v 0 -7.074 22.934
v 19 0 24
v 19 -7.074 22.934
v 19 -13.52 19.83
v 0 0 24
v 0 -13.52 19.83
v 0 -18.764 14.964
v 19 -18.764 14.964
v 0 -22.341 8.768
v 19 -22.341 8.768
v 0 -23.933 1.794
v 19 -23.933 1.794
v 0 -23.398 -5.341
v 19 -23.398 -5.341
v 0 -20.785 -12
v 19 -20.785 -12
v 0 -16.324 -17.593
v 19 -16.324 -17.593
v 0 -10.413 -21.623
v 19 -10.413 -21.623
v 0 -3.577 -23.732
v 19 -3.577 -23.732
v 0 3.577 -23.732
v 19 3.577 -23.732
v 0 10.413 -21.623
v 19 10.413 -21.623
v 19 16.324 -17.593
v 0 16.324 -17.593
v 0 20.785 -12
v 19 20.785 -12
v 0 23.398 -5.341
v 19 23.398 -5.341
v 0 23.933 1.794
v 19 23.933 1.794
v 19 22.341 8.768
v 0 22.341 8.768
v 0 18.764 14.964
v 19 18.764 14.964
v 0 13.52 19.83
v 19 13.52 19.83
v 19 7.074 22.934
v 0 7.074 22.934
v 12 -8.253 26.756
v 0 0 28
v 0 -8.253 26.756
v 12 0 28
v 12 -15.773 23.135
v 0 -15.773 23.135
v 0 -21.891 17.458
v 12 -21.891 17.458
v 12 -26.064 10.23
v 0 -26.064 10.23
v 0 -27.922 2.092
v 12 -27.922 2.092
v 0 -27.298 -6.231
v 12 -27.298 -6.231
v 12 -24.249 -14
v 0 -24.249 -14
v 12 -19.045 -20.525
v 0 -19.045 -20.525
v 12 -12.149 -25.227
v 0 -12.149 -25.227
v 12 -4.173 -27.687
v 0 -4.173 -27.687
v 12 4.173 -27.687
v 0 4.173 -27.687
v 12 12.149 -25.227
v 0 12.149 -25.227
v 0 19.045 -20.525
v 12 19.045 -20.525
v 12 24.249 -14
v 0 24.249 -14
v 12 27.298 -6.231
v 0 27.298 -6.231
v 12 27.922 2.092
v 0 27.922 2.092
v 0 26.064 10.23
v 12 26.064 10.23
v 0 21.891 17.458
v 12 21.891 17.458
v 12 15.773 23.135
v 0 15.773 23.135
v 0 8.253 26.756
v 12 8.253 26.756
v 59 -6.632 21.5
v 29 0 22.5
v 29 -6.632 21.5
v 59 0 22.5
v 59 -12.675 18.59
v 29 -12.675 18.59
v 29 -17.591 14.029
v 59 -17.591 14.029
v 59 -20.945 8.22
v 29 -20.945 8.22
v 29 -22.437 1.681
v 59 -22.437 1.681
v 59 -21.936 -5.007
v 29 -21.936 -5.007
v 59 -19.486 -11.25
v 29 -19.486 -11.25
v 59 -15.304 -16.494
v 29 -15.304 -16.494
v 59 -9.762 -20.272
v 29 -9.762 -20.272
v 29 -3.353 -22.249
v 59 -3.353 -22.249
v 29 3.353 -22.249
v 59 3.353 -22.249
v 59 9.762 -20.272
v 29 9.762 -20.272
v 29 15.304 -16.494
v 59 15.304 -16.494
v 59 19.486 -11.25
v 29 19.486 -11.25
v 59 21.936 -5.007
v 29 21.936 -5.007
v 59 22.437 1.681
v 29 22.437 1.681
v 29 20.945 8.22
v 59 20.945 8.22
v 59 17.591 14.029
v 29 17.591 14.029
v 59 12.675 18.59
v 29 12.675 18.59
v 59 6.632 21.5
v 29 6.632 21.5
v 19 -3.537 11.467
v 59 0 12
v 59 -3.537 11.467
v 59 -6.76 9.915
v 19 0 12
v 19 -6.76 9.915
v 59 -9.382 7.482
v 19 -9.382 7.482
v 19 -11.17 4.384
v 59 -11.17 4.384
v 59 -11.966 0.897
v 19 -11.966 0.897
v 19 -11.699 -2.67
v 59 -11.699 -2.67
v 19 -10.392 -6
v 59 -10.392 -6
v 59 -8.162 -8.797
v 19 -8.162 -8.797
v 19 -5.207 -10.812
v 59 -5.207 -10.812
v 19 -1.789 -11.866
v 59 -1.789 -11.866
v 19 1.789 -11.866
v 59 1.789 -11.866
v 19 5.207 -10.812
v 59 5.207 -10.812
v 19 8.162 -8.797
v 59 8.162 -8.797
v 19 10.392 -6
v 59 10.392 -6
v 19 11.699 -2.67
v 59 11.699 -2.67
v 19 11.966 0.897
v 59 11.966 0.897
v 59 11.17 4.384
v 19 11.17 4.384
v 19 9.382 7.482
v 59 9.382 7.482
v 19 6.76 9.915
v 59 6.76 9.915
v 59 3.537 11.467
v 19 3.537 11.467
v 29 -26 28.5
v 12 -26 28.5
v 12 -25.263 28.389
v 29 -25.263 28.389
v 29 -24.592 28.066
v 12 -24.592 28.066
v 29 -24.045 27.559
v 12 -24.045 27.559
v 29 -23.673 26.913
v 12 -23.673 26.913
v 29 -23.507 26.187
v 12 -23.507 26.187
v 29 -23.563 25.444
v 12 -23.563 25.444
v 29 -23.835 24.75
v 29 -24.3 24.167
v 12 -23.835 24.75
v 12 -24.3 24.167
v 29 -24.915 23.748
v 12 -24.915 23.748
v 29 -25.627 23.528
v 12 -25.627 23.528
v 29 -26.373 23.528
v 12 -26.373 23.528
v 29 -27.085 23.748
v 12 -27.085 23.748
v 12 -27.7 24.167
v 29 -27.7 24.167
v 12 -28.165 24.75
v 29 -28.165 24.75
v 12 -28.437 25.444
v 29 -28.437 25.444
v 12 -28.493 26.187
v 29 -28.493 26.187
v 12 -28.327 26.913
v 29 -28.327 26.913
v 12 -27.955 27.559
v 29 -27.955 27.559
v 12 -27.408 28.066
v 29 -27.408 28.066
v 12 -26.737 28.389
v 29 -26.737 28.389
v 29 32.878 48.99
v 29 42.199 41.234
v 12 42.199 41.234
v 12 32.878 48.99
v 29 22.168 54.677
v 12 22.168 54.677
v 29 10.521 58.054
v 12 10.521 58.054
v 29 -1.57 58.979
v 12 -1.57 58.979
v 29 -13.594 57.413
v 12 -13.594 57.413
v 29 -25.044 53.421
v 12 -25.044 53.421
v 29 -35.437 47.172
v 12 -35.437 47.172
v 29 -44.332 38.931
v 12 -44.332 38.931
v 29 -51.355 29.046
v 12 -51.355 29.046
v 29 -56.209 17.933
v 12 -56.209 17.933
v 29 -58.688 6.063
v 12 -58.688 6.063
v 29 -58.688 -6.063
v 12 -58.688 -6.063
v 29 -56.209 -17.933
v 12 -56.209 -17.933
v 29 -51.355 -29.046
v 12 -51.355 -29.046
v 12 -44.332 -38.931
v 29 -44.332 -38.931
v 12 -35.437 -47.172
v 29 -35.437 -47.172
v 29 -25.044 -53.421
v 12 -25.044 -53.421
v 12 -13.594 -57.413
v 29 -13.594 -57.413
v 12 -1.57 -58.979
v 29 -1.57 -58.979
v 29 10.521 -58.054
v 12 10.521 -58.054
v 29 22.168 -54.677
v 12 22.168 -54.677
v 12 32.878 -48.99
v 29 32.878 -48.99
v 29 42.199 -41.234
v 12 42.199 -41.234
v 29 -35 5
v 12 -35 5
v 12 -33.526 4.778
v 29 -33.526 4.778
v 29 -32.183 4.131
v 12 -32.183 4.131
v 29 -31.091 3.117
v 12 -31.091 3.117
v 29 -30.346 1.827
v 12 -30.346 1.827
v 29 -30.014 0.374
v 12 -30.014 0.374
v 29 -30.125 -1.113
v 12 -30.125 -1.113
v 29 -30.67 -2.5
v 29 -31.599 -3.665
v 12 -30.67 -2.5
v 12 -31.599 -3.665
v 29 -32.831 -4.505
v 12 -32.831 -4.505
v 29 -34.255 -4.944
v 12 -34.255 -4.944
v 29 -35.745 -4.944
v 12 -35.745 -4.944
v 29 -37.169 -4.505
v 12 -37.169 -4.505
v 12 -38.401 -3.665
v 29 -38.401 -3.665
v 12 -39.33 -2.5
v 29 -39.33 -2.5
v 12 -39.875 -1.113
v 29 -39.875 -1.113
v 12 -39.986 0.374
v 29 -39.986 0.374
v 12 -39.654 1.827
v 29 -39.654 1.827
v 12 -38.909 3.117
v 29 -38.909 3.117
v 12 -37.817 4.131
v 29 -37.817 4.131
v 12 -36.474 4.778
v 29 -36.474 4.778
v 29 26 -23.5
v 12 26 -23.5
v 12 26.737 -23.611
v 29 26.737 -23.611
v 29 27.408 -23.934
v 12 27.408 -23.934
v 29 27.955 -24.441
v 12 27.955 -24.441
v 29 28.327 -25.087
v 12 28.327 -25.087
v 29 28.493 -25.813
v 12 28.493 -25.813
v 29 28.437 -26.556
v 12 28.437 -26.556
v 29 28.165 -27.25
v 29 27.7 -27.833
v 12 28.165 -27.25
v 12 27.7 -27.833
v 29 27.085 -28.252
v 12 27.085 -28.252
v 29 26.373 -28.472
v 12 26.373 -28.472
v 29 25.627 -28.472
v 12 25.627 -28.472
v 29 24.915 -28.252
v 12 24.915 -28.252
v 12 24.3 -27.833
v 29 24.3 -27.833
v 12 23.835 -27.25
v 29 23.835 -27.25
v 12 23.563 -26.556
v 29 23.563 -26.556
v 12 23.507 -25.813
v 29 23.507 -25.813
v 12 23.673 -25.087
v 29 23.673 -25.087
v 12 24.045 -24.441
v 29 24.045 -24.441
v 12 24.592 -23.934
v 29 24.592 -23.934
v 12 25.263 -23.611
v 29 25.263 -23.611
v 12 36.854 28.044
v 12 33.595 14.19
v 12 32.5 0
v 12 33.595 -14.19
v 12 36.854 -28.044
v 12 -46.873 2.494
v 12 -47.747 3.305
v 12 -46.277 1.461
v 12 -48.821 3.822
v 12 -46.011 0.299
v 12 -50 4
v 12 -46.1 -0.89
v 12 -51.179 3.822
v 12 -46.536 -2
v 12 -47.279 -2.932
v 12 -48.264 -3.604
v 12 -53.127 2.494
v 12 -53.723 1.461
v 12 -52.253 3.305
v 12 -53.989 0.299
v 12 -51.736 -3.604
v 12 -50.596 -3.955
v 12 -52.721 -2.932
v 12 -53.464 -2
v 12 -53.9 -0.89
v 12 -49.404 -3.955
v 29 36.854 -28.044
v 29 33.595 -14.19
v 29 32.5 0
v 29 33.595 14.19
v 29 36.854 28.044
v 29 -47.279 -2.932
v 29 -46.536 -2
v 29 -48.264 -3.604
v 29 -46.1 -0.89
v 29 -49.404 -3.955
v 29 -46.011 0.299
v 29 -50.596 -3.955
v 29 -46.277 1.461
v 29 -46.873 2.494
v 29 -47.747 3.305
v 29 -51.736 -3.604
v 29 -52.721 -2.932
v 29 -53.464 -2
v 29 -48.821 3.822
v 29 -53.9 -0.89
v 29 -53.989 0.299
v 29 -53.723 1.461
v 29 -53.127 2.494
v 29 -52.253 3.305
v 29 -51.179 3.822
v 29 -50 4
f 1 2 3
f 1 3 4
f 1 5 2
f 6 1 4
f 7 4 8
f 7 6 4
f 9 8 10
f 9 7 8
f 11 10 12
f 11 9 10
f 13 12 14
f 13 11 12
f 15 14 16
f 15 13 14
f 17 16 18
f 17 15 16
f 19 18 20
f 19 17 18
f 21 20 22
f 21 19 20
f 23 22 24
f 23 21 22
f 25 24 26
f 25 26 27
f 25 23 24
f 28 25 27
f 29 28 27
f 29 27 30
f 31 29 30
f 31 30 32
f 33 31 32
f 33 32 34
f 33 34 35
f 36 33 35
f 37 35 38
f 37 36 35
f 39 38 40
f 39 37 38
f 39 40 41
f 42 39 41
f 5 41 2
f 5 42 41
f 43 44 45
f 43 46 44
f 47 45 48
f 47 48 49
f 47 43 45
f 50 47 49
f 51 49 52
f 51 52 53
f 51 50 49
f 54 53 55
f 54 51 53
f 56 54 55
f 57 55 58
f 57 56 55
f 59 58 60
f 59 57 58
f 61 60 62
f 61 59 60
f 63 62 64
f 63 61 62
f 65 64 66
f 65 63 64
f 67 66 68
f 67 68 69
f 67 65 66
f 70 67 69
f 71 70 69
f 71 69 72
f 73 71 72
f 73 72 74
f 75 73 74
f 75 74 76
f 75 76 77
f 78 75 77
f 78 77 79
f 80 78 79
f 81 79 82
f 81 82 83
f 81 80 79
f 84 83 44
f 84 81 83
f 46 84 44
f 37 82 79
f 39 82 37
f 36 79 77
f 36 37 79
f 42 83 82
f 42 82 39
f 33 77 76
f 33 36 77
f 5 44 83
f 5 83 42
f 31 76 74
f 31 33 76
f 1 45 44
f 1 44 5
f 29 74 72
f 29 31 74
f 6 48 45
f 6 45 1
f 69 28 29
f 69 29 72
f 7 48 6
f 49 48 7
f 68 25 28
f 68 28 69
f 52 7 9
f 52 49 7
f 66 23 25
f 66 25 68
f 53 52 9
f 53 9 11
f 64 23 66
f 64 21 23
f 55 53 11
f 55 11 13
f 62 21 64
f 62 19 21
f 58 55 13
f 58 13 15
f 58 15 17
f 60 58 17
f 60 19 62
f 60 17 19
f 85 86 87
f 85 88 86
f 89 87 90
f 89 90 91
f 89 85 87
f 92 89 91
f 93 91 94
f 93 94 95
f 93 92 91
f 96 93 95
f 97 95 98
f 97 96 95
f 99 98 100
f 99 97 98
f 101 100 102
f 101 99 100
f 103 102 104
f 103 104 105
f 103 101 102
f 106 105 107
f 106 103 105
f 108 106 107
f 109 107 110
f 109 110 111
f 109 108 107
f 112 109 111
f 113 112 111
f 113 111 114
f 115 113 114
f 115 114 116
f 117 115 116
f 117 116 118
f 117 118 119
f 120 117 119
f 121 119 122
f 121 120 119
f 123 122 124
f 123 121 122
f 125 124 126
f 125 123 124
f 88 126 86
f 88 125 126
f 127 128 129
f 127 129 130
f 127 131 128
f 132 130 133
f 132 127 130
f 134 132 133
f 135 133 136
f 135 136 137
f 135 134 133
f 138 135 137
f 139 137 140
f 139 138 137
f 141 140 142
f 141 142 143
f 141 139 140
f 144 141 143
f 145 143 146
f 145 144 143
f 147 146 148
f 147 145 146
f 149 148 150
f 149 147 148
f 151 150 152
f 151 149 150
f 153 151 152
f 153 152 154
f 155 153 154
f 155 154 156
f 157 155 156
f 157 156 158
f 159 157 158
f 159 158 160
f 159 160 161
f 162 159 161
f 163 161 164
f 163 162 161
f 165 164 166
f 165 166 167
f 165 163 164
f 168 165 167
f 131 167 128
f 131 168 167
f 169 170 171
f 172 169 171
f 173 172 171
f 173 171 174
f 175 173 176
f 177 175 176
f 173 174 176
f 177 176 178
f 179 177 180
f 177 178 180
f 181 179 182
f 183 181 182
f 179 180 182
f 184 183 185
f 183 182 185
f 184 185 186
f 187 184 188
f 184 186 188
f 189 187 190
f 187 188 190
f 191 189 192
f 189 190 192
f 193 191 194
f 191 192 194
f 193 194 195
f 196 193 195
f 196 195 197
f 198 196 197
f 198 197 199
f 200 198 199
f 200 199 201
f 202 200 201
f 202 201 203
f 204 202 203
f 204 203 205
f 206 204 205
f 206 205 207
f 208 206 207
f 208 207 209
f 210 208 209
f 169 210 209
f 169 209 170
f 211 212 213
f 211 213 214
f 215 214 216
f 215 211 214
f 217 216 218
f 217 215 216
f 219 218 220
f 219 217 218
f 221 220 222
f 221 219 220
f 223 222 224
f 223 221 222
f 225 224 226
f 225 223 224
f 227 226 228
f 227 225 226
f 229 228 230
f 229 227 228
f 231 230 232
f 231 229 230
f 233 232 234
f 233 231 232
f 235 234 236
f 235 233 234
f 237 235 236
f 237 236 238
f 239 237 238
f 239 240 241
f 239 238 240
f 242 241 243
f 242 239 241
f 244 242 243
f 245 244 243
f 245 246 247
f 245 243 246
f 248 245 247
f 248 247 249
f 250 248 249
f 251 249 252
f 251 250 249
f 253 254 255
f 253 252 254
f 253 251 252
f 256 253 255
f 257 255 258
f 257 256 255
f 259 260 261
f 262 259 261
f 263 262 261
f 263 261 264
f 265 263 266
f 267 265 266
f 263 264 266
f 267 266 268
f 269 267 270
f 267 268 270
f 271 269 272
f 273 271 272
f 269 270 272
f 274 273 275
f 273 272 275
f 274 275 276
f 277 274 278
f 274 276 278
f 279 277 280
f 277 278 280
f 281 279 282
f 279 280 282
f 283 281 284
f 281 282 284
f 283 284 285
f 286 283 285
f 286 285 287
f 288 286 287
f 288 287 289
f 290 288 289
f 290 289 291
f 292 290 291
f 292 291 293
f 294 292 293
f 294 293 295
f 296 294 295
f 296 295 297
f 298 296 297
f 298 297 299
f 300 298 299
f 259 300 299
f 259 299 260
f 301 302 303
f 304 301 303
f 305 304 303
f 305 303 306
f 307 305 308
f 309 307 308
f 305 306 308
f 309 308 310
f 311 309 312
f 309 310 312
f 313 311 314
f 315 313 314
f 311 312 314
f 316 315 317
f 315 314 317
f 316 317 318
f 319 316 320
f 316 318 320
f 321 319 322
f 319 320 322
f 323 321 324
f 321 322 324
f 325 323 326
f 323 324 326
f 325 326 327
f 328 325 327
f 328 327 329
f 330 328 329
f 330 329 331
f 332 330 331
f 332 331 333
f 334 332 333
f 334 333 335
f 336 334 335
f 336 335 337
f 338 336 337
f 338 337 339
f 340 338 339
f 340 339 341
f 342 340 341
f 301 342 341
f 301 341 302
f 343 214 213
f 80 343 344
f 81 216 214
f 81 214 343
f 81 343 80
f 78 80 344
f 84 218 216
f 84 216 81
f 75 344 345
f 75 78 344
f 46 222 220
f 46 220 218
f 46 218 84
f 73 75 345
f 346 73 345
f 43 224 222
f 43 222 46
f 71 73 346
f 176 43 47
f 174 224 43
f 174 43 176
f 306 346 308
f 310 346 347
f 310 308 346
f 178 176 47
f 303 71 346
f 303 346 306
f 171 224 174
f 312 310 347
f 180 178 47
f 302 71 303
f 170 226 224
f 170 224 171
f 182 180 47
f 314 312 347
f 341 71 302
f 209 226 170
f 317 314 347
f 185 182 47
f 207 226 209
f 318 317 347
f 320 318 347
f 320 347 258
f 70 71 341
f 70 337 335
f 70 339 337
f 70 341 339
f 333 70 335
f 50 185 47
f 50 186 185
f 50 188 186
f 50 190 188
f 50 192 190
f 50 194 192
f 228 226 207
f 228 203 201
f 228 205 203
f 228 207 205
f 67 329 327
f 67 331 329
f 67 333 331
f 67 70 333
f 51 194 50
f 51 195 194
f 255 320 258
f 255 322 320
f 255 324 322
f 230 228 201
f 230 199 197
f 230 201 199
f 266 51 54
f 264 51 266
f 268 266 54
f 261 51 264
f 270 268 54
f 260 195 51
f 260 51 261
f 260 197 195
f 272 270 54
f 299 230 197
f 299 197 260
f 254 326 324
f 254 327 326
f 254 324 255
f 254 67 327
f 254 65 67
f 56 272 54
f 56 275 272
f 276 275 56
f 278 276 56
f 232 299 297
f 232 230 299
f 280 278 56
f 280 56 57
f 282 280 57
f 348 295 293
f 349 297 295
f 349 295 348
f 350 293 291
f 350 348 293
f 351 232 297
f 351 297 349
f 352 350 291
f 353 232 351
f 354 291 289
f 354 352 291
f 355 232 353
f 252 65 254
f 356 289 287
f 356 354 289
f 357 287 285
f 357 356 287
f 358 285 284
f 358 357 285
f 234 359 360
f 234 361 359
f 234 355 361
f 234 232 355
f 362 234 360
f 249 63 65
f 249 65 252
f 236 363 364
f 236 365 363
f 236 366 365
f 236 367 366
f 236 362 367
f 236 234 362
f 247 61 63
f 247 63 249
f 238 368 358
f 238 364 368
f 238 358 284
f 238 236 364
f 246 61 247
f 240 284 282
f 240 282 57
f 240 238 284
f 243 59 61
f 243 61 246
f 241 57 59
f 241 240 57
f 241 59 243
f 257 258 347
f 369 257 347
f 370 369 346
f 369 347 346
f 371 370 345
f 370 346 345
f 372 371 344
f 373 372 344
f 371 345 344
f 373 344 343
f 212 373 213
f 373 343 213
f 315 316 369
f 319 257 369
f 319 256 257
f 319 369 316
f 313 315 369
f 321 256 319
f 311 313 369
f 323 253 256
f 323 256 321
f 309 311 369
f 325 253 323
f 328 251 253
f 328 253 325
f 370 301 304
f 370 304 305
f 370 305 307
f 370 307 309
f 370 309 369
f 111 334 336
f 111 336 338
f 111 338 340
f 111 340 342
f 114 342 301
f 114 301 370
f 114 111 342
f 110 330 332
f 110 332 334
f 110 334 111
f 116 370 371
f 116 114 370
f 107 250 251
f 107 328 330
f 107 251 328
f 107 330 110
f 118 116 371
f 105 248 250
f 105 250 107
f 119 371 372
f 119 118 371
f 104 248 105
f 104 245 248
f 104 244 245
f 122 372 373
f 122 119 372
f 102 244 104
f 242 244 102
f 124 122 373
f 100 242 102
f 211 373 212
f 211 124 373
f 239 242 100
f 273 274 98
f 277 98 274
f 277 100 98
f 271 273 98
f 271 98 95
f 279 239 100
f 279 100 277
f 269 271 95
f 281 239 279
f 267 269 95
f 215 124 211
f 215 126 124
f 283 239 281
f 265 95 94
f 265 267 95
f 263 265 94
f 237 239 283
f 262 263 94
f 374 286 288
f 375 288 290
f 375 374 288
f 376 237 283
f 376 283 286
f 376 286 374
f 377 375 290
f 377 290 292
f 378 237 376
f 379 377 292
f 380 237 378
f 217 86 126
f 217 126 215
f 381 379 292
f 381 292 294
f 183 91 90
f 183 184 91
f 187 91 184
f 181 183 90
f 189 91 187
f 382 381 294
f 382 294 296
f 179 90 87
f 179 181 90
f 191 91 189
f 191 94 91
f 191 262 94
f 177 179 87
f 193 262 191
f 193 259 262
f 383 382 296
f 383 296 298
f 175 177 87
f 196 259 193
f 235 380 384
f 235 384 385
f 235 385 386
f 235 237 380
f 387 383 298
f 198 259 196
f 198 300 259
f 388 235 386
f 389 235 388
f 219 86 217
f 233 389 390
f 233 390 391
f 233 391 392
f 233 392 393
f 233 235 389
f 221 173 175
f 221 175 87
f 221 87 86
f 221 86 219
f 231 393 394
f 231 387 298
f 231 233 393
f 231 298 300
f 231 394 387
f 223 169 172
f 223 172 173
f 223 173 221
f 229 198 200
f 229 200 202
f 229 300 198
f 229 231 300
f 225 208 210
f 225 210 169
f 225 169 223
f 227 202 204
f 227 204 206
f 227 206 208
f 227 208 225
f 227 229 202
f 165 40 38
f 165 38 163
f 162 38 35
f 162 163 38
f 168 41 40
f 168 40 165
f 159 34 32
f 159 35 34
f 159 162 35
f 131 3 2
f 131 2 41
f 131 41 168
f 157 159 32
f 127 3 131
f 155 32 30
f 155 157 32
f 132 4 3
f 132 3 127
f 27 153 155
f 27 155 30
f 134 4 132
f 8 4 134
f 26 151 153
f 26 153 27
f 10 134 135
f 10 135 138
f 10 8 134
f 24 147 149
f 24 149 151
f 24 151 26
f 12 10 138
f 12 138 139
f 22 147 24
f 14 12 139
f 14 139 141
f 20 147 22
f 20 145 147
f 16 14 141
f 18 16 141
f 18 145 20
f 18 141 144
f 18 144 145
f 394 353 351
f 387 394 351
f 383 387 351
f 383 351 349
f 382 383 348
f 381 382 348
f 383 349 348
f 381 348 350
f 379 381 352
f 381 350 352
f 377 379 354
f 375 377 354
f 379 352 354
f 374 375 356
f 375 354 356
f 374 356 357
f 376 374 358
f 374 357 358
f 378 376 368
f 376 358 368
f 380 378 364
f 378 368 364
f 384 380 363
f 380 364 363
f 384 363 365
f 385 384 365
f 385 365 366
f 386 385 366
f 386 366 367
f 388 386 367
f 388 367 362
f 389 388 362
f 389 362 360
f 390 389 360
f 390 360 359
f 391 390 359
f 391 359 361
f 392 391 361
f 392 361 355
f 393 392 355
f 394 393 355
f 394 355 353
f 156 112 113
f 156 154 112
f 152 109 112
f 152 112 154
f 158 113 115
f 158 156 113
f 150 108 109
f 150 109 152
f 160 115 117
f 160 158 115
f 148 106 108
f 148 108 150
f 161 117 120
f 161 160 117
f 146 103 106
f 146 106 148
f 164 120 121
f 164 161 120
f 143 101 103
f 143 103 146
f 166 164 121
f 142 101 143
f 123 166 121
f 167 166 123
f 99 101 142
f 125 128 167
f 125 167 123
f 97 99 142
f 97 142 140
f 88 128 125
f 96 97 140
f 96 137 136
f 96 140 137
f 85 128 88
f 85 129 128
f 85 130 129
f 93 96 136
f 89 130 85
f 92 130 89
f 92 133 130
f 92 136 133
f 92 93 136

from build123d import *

# Parameters (mm, degrees)
ESQUISSE2_R             = 92.5
ENL_V_MAT_EXTRU_1_DEPTH = 96.765338197
ESQUISSE6_R             = 5
ESQUISSE6_R_2           = 4
ENL_V_MAT_EXTRU_2_DEPTH = 96.765338197
ESQUISSE7_R             = 2.5
ENL_V_MAT_EXTRU_3_DEPTH = 96.765338197


with BuildPart() as part:
    # Esquisse1 → Base-Révolution (revolve)
    with BuildSketch(Plane.XY, mode=Mode.PRIVATE) as base_r_volution_sk:
        Polygon((0, 24), (0, 28), (12, 28), (12, 59), (29, 59), (29, 22.5), (59, 22.5), (59, 12), (19, 12), (19, 24), align=None)
    revolve(base_r_volution_sk.sketch.rotate(Axis((-50, 0, 0), (1, 0, 0)), 90), axis=Axis((-50, 0, 0), (1, 0, 0)))

    # Esquisse2 → Enlèv. mat.-Extru.1 (cut, through all)
    with BuildSketch(Plane.ZY.offset(-12)):
        with Locations((0, 125)):
            Circle(ESQUISSE2_R)
    extrude(amount=-ENL_V_MAT_EXTRU_1_DEPTH, mode=Mode.SUBTRACT)

    # Esquisse6 → Enlèv. mat.-Extru.2 (cut, through all)
    with BuildSketch(Plane.ZY.offset(-12)):
        with Locations((0, -35)):
            Circle(ESQUISSE6_R)
        with Locations((0, -50)):
            Circle(ESQUISSE6_R_2)
    extrude(amount=-ENL_V_MAT_EXTRU_2_DEPTH, mode=Mode.SUBTRACT)

    # Esquisse7 → Enlèv. mat.-Extru.3 (cut, through all)
    with BuildSketch(Plane.ZY.offset(-12)):
        with Locations((-26, 26)):
            Circle(ESQUISSE7_R)
        with Locations((26, -26)):
            Circle(ESQUISSE7_R)
    extrude(amount=-ENL_V_MAT_EXTRU_3_DEPTH, mode=Mode.SUBTRACT)


solid = part.part
